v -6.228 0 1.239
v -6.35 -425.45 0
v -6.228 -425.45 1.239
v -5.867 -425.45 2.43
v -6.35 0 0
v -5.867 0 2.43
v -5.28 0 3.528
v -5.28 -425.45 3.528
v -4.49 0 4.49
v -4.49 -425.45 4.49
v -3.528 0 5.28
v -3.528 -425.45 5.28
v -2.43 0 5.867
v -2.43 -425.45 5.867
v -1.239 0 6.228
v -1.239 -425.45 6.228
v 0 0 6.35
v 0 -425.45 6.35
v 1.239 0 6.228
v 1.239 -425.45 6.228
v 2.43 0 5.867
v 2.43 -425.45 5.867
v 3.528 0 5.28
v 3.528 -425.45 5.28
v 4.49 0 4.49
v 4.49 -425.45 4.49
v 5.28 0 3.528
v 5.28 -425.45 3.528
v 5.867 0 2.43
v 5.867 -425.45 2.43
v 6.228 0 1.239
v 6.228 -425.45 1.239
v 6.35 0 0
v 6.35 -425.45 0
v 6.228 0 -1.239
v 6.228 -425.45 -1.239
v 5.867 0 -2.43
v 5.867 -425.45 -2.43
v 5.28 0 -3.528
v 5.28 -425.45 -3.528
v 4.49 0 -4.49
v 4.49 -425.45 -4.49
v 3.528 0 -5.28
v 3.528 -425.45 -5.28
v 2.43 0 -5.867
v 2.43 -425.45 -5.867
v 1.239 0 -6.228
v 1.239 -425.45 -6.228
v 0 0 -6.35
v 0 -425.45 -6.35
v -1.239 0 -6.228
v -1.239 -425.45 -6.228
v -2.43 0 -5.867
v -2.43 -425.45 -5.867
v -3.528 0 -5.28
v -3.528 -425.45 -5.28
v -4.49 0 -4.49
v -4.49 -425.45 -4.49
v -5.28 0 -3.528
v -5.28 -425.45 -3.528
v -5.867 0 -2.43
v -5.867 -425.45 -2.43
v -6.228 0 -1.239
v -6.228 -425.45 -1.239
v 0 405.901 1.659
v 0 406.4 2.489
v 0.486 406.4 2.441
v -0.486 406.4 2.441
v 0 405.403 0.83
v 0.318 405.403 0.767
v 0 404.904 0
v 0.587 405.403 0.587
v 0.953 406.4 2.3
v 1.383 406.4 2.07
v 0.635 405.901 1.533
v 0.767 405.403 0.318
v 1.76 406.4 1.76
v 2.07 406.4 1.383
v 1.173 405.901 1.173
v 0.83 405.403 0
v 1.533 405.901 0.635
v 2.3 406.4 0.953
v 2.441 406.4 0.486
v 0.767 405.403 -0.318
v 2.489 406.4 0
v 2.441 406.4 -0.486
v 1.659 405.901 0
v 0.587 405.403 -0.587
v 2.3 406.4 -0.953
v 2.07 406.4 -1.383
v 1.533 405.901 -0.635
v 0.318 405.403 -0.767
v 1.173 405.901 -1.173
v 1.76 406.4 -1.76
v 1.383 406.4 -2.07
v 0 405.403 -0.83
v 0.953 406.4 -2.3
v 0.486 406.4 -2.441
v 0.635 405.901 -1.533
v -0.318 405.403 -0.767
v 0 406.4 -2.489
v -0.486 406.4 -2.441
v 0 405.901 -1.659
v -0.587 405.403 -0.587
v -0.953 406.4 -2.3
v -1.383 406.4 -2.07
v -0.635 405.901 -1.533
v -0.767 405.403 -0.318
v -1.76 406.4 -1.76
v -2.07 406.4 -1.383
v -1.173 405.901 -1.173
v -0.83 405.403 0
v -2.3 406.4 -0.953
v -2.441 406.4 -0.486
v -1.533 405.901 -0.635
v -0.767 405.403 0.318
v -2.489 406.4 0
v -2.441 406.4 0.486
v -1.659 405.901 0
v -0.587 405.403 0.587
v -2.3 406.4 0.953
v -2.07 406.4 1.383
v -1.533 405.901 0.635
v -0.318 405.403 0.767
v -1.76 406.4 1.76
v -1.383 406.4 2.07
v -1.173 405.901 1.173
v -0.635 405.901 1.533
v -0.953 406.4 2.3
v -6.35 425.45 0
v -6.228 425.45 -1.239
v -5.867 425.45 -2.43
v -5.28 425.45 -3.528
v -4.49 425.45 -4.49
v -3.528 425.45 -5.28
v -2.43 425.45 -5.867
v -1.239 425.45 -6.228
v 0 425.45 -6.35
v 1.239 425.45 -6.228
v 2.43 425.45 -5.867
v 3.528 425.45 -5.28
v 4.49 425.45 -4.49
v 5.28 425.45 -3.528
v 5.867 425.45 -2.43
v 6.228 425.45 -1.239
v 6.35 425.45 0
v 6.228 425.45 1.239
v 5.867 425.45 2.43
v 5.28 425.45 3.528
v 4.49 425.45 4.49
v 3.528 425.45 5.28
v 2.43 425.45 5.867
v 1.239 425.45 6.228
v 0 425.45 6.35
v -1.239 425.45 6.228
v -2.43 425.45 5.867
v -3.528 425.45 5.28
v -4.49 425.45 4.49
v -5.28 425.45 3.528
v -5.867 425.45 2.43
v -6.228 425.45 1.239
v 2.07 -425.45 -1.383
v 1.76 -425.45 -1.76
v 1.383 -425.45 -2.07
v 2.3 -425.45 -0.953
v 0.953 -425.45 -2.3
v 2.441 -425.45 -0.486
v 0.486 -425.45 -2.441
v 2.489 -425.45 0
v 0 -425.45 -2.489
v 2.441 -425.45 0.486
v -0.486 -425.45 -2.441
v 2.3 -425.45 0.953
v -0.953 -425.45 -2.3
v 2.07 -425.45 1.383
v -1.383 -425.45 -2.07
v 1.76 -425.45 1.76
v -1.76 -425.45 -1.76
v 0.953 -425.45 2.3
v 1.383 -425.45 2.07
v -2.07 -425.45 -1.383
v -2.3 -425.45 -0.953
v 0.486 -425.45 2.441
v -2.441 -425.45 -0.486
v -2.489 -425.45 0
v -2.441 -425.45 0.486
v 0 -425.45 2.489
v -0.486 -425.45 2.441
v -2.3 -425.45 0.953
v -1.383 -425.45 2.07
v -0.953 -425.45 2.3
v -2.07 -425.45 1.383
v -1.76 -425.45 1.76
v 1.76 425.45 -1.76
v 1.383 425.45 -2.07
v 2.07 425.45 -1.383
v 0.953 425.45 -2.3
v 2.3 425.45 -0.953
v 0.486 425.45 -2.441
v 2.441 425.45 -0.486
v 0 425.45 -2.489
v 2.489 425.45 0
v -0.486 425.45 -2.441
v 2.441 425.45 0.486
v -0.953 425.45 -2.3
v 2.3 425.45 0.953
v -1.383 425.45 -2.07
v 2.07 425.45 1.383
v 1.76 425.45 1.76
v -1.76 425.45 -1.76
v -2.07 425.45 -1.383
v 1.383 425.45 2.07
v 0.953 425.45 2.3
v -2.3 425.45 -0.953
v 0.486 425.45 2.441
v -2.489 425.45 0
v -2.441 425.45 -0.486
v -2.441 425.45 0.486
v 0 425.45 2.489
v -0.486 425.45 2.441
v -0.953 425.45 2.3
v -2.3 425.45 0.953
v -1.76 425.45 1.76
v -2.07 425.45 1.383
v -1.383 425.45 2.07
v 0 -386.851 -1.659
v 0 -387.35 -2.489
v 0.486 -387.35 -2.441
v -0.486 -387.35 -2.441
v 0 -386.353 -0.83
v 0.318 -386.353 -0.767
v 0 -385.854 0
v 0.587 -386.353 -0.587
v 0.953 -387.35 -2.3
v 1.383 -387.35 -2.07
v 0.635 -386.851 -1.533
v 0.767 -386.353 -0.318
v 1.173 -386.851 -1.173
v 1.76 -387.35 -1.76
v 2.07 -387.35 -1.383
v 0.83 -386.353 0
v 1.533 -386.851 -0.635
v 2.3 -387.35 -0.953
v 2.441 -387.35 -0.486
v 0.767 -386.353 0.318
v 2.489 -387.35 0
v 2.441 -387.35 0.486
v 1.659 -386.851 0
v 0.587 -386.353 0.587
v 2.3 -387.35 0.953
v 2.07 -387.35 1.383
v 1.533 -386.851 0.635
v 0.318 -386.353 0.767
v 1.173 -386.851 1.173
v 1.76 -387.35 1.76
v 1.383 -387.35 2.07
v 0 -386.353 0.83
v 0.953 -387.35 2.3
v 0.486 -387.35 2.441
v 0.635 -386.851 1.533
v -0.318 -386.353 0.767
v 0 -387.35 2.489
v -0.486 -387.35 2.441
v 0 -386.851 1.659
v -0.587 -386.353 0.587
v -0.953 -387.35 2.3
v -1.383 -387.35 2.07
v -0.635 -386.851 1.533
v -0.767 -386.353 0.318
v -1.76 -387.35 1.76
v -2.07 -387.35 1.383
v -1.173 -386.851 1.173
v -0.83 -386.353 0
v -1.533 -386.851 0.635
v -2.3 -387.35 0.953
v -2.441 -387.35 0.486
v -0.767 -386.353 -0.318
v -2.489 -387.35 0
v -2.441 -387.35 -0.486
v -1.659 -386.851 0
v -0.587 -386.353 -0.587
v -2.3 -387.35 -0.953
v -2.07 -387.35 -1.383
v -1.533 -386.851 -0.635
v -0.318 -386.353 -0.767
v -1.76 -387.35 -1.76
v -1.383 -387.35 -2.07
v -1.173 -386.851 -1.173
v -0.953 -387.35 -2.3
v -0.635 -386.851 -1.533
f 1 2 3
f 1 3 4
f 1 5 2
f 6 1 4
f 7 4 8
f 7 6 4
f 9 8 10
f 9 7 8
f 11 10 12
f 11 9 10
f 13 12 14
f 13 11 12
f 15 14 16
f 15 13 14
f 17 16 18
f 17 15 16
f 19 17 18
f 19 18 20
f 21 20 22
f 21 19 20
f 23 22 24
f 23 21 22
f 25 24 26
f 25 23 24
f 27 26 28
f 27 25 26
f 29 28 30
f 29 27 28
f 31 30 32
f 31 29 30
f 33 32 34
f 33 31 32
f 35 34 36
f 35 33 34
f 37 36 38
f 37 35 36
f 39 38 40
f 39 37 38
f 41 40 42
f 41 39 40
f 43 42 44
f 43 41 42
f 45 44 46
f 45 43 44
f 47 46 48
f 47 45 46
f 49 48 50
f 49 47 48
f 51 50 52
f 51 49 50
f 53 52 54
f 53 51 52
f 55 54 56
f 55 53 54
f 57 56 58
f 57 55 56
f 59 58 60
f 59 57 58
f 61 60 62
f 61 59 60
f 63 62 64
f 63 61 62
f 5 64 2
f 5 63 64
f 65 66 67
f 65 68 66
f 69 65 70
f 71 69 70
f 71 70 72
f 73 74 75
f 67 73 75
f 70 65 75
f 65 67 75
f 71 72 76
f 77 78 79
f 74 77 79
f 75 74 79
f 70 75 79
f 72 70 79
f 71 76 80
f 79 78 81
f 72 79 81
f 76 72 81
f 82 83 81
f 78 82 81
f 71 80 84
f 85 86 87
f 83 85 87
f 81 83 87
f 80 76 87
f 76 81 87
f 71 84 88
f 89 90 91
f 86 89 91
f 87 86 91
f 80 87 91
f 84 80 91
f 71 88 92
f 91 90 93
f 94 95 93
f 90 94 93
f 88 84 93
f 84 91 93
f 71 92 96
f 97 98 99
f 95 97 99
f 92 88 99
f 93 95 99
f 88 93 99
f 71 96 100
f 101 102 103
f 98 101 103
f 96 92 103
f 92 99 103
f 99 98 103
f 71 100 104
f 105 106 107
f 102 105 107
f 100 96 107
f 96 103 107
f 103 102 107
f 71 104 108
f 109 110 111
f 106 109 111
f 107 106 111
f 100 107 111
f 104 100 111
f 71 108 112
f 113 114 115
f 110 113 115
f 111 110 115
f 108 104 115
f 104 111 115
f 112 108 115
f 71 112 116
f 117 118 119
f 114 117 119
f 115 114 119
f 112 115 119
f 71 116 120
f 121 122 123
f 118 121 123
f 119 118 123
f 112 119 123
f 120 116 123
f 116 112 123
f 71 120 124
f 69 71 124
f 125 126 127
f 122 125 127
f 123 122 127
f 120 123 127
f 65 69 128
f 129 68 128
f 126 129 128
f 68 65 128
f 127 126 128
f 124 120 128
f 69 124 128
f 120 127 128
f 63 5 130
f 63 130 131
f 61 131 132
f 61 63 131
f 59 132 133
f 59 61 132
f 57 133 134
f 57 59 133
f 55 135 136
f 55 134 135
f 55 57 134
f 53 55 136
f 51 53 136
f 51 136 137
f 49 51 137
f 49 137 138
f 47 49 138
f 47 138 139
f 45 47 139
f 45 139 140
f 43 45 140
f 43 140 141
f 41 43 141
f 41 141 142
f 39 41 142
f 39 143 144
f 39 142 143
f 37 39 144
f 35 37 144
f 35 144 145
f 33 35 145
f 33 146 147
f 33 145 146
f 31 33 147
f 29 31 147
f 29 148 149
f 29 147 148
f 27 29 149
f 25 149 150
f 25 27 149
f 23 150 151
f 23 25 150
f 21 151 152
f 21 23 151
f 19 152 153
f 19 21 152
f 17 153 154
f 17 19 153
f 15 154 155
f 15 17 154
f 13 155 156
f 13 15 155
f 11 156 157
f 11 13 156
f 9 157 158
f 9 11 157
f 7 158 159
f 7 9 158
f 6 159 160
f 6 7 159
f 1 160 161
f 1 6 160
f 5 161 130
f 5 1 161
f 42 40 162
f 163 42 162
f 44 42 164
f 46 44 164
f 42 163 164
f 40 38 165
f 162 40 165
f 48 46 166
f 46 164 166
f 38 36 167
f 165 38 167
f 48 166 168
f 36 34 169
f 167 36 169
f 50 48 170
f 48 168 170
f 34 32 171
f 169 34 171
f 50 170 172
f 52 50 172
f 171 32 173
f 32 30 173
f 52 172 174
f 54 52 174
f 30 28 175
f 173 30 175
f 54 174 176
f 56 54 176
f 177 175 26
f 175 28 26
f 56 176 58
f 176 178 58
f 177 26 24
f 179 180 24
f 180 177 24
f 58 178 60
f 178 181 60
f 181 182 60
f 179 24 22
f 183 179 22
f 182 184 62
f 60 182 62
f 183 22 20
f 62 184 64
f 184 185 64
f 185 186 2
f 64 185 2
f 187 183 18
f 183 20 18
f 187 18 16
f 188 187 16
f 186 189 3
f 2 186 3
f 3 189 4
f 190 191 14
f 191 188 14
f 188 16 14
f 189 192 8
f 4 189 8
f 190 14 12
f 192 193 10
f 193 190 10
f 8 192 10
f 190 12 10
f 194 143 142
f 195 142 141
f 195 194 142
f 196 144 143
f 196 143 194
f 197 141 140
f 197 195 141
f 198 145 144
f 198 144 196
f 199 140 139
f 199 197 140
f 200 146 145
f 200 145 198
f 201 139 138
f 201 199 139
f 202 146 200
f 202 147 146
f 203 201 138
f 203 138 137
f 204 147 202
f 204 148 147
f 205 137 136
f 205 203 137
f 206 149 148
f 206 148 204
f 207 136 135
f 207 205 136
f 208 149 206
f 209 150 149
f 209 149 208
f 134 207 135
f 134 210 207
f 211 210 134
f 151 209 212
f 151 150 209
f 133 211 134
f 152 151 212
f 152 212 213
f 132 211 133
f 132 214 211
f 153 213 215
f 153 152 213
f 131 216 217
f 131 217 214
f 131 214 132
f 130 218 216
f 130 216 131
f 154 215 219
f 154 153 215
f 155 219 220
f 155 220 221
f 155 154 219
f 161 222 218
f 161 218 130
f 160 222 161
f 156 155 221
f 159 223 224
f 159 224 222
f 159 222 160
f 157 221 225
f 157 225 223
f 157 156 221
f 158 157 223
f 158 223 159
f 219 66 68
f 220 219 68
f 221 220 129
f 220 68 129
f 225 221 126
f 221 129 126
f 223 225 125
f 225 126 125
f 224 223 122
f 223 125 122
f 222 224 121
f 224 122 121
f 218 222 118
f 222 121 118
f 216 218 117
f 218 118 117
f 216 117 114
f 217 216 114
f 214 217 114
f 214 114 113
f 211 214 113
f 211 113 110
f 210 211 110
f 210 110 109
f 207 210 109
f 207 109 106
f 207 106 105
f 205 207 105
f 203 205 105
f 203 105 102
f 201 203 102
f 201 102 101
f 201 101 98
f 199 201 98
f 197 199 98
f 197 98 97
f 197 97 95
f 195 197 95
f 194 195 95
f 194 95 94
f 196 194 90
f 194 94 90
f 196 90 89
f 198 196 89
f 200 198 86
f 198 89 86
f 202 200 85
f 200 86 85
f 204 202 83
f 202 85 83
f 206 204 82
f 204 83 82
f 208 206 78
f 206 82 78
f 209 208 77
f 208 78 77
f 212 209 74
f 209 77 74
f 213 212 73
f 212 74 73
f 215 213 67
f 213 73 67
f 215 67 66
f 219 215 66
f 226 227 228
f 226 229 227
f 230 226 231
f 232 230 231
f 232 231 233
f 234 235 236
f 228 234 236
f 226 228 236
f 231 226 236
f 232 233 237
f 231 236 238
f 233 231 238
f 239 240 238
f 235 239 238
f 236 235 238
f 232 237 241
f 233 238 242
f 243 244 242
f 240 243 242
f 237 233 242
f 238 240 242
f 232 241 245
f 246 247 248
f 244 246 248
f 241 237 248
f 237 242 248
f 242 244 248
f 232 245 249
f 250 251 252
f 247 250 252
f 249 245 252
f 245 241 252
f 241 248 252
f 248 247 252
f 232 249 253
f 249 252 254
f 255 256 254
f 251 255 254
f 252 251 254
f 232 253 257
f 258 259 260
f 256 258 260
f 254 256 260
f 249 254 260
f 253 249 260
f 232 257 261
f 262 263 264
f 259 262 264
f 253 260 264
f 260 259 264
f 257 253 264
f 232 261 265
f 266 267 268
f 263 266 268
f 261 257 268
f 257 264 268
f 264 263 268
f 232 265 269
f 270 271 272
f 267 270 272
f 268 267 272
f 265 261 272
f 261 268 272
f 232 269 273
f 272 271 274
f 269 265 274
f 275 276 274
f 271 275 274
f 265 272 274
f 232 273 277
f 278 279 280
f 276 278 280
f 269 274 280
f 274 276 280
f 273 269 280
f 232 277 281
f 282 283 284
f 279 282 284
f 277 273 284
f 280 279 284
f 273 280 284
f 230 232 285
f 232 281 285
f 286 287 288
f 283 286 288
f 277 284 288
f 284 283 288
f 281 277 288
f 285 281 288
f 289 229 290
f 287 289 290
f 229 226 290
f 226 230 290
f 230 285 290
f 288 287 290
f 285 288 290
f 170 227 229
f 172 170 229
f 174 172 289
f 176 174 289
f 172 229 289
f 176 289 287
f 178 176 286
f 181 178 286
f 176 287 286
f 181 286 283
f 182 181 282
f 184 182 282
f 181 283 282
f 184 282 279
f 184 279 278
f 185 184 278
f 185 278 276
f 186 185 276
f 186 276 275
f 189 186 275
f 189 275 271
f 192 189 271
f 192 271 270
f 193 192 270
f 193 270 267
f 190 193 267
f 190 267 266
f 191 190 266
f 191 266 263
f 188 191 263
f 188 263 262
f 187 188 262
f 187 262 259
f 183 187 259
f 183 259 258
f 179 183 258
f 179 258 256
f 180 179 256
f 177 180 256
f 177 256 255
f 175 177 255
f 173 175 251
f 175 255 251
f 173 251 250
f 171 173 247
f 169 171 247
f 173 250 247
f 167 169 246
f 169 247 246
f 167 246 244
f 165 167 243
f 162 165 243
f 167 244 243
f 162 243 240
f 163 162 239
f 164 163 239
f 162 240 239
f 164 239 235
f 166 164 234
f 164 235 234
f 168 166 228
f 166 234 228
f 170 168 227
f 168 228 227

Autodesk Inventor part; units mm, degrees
ref_plane "YZ Plane" through (0, 0, 0) normal (1, 0, 0) x (0, 1, 0)
ref_plane "XZ Plane" through (0, 0, 0) normal (0, 1, 0) x (-1, 0, 0)
ref_plane "XY Plane" through (0, 0, 0) normal (0, 0, 1) x (1, 0, 0)
sketch "Sketch1" plane through (0, 0, 0) normal (0, 1, 0) x (-1, 0, 0)
  circle A0 centre (0, 0) radius 6.35
  dimension "d0" = 12.7
extrude "Extrusion1" add sketch "Sketch1" along normal mid plane 850.9
sketch "Sketch2" plane through (0, 425.45, 0) normal (0, 1, 0) x (1, 0, 0)
  circle A0 centre (0, 0) radius 6.35 construction
hole "Hole1" at (0, 425.45, 0) direction (0, -1, 0) diameter 4.9784 depth 19.05 tip angle 118 thread size "1/4-20 UNC" class "2B" standard "ANSI Unified Screw Threads"
sketch "Sketch3" plane through (0, -425.45, 0) normal (0, -1, 0) x (1, 0, 0)
  circle A0 centre (0, 0) radius 6.35 construction
hole "Hole2" at (0, -425.45, 0) direction (0, 1, 0) diameter 4.9784 depth 38.1 tip angle 118 thread size "1/4-20 UNC" class "2B" standard "ANSI Unified Screw Threads"
properties part number "EL2-025" material "Aluminum 6061"
